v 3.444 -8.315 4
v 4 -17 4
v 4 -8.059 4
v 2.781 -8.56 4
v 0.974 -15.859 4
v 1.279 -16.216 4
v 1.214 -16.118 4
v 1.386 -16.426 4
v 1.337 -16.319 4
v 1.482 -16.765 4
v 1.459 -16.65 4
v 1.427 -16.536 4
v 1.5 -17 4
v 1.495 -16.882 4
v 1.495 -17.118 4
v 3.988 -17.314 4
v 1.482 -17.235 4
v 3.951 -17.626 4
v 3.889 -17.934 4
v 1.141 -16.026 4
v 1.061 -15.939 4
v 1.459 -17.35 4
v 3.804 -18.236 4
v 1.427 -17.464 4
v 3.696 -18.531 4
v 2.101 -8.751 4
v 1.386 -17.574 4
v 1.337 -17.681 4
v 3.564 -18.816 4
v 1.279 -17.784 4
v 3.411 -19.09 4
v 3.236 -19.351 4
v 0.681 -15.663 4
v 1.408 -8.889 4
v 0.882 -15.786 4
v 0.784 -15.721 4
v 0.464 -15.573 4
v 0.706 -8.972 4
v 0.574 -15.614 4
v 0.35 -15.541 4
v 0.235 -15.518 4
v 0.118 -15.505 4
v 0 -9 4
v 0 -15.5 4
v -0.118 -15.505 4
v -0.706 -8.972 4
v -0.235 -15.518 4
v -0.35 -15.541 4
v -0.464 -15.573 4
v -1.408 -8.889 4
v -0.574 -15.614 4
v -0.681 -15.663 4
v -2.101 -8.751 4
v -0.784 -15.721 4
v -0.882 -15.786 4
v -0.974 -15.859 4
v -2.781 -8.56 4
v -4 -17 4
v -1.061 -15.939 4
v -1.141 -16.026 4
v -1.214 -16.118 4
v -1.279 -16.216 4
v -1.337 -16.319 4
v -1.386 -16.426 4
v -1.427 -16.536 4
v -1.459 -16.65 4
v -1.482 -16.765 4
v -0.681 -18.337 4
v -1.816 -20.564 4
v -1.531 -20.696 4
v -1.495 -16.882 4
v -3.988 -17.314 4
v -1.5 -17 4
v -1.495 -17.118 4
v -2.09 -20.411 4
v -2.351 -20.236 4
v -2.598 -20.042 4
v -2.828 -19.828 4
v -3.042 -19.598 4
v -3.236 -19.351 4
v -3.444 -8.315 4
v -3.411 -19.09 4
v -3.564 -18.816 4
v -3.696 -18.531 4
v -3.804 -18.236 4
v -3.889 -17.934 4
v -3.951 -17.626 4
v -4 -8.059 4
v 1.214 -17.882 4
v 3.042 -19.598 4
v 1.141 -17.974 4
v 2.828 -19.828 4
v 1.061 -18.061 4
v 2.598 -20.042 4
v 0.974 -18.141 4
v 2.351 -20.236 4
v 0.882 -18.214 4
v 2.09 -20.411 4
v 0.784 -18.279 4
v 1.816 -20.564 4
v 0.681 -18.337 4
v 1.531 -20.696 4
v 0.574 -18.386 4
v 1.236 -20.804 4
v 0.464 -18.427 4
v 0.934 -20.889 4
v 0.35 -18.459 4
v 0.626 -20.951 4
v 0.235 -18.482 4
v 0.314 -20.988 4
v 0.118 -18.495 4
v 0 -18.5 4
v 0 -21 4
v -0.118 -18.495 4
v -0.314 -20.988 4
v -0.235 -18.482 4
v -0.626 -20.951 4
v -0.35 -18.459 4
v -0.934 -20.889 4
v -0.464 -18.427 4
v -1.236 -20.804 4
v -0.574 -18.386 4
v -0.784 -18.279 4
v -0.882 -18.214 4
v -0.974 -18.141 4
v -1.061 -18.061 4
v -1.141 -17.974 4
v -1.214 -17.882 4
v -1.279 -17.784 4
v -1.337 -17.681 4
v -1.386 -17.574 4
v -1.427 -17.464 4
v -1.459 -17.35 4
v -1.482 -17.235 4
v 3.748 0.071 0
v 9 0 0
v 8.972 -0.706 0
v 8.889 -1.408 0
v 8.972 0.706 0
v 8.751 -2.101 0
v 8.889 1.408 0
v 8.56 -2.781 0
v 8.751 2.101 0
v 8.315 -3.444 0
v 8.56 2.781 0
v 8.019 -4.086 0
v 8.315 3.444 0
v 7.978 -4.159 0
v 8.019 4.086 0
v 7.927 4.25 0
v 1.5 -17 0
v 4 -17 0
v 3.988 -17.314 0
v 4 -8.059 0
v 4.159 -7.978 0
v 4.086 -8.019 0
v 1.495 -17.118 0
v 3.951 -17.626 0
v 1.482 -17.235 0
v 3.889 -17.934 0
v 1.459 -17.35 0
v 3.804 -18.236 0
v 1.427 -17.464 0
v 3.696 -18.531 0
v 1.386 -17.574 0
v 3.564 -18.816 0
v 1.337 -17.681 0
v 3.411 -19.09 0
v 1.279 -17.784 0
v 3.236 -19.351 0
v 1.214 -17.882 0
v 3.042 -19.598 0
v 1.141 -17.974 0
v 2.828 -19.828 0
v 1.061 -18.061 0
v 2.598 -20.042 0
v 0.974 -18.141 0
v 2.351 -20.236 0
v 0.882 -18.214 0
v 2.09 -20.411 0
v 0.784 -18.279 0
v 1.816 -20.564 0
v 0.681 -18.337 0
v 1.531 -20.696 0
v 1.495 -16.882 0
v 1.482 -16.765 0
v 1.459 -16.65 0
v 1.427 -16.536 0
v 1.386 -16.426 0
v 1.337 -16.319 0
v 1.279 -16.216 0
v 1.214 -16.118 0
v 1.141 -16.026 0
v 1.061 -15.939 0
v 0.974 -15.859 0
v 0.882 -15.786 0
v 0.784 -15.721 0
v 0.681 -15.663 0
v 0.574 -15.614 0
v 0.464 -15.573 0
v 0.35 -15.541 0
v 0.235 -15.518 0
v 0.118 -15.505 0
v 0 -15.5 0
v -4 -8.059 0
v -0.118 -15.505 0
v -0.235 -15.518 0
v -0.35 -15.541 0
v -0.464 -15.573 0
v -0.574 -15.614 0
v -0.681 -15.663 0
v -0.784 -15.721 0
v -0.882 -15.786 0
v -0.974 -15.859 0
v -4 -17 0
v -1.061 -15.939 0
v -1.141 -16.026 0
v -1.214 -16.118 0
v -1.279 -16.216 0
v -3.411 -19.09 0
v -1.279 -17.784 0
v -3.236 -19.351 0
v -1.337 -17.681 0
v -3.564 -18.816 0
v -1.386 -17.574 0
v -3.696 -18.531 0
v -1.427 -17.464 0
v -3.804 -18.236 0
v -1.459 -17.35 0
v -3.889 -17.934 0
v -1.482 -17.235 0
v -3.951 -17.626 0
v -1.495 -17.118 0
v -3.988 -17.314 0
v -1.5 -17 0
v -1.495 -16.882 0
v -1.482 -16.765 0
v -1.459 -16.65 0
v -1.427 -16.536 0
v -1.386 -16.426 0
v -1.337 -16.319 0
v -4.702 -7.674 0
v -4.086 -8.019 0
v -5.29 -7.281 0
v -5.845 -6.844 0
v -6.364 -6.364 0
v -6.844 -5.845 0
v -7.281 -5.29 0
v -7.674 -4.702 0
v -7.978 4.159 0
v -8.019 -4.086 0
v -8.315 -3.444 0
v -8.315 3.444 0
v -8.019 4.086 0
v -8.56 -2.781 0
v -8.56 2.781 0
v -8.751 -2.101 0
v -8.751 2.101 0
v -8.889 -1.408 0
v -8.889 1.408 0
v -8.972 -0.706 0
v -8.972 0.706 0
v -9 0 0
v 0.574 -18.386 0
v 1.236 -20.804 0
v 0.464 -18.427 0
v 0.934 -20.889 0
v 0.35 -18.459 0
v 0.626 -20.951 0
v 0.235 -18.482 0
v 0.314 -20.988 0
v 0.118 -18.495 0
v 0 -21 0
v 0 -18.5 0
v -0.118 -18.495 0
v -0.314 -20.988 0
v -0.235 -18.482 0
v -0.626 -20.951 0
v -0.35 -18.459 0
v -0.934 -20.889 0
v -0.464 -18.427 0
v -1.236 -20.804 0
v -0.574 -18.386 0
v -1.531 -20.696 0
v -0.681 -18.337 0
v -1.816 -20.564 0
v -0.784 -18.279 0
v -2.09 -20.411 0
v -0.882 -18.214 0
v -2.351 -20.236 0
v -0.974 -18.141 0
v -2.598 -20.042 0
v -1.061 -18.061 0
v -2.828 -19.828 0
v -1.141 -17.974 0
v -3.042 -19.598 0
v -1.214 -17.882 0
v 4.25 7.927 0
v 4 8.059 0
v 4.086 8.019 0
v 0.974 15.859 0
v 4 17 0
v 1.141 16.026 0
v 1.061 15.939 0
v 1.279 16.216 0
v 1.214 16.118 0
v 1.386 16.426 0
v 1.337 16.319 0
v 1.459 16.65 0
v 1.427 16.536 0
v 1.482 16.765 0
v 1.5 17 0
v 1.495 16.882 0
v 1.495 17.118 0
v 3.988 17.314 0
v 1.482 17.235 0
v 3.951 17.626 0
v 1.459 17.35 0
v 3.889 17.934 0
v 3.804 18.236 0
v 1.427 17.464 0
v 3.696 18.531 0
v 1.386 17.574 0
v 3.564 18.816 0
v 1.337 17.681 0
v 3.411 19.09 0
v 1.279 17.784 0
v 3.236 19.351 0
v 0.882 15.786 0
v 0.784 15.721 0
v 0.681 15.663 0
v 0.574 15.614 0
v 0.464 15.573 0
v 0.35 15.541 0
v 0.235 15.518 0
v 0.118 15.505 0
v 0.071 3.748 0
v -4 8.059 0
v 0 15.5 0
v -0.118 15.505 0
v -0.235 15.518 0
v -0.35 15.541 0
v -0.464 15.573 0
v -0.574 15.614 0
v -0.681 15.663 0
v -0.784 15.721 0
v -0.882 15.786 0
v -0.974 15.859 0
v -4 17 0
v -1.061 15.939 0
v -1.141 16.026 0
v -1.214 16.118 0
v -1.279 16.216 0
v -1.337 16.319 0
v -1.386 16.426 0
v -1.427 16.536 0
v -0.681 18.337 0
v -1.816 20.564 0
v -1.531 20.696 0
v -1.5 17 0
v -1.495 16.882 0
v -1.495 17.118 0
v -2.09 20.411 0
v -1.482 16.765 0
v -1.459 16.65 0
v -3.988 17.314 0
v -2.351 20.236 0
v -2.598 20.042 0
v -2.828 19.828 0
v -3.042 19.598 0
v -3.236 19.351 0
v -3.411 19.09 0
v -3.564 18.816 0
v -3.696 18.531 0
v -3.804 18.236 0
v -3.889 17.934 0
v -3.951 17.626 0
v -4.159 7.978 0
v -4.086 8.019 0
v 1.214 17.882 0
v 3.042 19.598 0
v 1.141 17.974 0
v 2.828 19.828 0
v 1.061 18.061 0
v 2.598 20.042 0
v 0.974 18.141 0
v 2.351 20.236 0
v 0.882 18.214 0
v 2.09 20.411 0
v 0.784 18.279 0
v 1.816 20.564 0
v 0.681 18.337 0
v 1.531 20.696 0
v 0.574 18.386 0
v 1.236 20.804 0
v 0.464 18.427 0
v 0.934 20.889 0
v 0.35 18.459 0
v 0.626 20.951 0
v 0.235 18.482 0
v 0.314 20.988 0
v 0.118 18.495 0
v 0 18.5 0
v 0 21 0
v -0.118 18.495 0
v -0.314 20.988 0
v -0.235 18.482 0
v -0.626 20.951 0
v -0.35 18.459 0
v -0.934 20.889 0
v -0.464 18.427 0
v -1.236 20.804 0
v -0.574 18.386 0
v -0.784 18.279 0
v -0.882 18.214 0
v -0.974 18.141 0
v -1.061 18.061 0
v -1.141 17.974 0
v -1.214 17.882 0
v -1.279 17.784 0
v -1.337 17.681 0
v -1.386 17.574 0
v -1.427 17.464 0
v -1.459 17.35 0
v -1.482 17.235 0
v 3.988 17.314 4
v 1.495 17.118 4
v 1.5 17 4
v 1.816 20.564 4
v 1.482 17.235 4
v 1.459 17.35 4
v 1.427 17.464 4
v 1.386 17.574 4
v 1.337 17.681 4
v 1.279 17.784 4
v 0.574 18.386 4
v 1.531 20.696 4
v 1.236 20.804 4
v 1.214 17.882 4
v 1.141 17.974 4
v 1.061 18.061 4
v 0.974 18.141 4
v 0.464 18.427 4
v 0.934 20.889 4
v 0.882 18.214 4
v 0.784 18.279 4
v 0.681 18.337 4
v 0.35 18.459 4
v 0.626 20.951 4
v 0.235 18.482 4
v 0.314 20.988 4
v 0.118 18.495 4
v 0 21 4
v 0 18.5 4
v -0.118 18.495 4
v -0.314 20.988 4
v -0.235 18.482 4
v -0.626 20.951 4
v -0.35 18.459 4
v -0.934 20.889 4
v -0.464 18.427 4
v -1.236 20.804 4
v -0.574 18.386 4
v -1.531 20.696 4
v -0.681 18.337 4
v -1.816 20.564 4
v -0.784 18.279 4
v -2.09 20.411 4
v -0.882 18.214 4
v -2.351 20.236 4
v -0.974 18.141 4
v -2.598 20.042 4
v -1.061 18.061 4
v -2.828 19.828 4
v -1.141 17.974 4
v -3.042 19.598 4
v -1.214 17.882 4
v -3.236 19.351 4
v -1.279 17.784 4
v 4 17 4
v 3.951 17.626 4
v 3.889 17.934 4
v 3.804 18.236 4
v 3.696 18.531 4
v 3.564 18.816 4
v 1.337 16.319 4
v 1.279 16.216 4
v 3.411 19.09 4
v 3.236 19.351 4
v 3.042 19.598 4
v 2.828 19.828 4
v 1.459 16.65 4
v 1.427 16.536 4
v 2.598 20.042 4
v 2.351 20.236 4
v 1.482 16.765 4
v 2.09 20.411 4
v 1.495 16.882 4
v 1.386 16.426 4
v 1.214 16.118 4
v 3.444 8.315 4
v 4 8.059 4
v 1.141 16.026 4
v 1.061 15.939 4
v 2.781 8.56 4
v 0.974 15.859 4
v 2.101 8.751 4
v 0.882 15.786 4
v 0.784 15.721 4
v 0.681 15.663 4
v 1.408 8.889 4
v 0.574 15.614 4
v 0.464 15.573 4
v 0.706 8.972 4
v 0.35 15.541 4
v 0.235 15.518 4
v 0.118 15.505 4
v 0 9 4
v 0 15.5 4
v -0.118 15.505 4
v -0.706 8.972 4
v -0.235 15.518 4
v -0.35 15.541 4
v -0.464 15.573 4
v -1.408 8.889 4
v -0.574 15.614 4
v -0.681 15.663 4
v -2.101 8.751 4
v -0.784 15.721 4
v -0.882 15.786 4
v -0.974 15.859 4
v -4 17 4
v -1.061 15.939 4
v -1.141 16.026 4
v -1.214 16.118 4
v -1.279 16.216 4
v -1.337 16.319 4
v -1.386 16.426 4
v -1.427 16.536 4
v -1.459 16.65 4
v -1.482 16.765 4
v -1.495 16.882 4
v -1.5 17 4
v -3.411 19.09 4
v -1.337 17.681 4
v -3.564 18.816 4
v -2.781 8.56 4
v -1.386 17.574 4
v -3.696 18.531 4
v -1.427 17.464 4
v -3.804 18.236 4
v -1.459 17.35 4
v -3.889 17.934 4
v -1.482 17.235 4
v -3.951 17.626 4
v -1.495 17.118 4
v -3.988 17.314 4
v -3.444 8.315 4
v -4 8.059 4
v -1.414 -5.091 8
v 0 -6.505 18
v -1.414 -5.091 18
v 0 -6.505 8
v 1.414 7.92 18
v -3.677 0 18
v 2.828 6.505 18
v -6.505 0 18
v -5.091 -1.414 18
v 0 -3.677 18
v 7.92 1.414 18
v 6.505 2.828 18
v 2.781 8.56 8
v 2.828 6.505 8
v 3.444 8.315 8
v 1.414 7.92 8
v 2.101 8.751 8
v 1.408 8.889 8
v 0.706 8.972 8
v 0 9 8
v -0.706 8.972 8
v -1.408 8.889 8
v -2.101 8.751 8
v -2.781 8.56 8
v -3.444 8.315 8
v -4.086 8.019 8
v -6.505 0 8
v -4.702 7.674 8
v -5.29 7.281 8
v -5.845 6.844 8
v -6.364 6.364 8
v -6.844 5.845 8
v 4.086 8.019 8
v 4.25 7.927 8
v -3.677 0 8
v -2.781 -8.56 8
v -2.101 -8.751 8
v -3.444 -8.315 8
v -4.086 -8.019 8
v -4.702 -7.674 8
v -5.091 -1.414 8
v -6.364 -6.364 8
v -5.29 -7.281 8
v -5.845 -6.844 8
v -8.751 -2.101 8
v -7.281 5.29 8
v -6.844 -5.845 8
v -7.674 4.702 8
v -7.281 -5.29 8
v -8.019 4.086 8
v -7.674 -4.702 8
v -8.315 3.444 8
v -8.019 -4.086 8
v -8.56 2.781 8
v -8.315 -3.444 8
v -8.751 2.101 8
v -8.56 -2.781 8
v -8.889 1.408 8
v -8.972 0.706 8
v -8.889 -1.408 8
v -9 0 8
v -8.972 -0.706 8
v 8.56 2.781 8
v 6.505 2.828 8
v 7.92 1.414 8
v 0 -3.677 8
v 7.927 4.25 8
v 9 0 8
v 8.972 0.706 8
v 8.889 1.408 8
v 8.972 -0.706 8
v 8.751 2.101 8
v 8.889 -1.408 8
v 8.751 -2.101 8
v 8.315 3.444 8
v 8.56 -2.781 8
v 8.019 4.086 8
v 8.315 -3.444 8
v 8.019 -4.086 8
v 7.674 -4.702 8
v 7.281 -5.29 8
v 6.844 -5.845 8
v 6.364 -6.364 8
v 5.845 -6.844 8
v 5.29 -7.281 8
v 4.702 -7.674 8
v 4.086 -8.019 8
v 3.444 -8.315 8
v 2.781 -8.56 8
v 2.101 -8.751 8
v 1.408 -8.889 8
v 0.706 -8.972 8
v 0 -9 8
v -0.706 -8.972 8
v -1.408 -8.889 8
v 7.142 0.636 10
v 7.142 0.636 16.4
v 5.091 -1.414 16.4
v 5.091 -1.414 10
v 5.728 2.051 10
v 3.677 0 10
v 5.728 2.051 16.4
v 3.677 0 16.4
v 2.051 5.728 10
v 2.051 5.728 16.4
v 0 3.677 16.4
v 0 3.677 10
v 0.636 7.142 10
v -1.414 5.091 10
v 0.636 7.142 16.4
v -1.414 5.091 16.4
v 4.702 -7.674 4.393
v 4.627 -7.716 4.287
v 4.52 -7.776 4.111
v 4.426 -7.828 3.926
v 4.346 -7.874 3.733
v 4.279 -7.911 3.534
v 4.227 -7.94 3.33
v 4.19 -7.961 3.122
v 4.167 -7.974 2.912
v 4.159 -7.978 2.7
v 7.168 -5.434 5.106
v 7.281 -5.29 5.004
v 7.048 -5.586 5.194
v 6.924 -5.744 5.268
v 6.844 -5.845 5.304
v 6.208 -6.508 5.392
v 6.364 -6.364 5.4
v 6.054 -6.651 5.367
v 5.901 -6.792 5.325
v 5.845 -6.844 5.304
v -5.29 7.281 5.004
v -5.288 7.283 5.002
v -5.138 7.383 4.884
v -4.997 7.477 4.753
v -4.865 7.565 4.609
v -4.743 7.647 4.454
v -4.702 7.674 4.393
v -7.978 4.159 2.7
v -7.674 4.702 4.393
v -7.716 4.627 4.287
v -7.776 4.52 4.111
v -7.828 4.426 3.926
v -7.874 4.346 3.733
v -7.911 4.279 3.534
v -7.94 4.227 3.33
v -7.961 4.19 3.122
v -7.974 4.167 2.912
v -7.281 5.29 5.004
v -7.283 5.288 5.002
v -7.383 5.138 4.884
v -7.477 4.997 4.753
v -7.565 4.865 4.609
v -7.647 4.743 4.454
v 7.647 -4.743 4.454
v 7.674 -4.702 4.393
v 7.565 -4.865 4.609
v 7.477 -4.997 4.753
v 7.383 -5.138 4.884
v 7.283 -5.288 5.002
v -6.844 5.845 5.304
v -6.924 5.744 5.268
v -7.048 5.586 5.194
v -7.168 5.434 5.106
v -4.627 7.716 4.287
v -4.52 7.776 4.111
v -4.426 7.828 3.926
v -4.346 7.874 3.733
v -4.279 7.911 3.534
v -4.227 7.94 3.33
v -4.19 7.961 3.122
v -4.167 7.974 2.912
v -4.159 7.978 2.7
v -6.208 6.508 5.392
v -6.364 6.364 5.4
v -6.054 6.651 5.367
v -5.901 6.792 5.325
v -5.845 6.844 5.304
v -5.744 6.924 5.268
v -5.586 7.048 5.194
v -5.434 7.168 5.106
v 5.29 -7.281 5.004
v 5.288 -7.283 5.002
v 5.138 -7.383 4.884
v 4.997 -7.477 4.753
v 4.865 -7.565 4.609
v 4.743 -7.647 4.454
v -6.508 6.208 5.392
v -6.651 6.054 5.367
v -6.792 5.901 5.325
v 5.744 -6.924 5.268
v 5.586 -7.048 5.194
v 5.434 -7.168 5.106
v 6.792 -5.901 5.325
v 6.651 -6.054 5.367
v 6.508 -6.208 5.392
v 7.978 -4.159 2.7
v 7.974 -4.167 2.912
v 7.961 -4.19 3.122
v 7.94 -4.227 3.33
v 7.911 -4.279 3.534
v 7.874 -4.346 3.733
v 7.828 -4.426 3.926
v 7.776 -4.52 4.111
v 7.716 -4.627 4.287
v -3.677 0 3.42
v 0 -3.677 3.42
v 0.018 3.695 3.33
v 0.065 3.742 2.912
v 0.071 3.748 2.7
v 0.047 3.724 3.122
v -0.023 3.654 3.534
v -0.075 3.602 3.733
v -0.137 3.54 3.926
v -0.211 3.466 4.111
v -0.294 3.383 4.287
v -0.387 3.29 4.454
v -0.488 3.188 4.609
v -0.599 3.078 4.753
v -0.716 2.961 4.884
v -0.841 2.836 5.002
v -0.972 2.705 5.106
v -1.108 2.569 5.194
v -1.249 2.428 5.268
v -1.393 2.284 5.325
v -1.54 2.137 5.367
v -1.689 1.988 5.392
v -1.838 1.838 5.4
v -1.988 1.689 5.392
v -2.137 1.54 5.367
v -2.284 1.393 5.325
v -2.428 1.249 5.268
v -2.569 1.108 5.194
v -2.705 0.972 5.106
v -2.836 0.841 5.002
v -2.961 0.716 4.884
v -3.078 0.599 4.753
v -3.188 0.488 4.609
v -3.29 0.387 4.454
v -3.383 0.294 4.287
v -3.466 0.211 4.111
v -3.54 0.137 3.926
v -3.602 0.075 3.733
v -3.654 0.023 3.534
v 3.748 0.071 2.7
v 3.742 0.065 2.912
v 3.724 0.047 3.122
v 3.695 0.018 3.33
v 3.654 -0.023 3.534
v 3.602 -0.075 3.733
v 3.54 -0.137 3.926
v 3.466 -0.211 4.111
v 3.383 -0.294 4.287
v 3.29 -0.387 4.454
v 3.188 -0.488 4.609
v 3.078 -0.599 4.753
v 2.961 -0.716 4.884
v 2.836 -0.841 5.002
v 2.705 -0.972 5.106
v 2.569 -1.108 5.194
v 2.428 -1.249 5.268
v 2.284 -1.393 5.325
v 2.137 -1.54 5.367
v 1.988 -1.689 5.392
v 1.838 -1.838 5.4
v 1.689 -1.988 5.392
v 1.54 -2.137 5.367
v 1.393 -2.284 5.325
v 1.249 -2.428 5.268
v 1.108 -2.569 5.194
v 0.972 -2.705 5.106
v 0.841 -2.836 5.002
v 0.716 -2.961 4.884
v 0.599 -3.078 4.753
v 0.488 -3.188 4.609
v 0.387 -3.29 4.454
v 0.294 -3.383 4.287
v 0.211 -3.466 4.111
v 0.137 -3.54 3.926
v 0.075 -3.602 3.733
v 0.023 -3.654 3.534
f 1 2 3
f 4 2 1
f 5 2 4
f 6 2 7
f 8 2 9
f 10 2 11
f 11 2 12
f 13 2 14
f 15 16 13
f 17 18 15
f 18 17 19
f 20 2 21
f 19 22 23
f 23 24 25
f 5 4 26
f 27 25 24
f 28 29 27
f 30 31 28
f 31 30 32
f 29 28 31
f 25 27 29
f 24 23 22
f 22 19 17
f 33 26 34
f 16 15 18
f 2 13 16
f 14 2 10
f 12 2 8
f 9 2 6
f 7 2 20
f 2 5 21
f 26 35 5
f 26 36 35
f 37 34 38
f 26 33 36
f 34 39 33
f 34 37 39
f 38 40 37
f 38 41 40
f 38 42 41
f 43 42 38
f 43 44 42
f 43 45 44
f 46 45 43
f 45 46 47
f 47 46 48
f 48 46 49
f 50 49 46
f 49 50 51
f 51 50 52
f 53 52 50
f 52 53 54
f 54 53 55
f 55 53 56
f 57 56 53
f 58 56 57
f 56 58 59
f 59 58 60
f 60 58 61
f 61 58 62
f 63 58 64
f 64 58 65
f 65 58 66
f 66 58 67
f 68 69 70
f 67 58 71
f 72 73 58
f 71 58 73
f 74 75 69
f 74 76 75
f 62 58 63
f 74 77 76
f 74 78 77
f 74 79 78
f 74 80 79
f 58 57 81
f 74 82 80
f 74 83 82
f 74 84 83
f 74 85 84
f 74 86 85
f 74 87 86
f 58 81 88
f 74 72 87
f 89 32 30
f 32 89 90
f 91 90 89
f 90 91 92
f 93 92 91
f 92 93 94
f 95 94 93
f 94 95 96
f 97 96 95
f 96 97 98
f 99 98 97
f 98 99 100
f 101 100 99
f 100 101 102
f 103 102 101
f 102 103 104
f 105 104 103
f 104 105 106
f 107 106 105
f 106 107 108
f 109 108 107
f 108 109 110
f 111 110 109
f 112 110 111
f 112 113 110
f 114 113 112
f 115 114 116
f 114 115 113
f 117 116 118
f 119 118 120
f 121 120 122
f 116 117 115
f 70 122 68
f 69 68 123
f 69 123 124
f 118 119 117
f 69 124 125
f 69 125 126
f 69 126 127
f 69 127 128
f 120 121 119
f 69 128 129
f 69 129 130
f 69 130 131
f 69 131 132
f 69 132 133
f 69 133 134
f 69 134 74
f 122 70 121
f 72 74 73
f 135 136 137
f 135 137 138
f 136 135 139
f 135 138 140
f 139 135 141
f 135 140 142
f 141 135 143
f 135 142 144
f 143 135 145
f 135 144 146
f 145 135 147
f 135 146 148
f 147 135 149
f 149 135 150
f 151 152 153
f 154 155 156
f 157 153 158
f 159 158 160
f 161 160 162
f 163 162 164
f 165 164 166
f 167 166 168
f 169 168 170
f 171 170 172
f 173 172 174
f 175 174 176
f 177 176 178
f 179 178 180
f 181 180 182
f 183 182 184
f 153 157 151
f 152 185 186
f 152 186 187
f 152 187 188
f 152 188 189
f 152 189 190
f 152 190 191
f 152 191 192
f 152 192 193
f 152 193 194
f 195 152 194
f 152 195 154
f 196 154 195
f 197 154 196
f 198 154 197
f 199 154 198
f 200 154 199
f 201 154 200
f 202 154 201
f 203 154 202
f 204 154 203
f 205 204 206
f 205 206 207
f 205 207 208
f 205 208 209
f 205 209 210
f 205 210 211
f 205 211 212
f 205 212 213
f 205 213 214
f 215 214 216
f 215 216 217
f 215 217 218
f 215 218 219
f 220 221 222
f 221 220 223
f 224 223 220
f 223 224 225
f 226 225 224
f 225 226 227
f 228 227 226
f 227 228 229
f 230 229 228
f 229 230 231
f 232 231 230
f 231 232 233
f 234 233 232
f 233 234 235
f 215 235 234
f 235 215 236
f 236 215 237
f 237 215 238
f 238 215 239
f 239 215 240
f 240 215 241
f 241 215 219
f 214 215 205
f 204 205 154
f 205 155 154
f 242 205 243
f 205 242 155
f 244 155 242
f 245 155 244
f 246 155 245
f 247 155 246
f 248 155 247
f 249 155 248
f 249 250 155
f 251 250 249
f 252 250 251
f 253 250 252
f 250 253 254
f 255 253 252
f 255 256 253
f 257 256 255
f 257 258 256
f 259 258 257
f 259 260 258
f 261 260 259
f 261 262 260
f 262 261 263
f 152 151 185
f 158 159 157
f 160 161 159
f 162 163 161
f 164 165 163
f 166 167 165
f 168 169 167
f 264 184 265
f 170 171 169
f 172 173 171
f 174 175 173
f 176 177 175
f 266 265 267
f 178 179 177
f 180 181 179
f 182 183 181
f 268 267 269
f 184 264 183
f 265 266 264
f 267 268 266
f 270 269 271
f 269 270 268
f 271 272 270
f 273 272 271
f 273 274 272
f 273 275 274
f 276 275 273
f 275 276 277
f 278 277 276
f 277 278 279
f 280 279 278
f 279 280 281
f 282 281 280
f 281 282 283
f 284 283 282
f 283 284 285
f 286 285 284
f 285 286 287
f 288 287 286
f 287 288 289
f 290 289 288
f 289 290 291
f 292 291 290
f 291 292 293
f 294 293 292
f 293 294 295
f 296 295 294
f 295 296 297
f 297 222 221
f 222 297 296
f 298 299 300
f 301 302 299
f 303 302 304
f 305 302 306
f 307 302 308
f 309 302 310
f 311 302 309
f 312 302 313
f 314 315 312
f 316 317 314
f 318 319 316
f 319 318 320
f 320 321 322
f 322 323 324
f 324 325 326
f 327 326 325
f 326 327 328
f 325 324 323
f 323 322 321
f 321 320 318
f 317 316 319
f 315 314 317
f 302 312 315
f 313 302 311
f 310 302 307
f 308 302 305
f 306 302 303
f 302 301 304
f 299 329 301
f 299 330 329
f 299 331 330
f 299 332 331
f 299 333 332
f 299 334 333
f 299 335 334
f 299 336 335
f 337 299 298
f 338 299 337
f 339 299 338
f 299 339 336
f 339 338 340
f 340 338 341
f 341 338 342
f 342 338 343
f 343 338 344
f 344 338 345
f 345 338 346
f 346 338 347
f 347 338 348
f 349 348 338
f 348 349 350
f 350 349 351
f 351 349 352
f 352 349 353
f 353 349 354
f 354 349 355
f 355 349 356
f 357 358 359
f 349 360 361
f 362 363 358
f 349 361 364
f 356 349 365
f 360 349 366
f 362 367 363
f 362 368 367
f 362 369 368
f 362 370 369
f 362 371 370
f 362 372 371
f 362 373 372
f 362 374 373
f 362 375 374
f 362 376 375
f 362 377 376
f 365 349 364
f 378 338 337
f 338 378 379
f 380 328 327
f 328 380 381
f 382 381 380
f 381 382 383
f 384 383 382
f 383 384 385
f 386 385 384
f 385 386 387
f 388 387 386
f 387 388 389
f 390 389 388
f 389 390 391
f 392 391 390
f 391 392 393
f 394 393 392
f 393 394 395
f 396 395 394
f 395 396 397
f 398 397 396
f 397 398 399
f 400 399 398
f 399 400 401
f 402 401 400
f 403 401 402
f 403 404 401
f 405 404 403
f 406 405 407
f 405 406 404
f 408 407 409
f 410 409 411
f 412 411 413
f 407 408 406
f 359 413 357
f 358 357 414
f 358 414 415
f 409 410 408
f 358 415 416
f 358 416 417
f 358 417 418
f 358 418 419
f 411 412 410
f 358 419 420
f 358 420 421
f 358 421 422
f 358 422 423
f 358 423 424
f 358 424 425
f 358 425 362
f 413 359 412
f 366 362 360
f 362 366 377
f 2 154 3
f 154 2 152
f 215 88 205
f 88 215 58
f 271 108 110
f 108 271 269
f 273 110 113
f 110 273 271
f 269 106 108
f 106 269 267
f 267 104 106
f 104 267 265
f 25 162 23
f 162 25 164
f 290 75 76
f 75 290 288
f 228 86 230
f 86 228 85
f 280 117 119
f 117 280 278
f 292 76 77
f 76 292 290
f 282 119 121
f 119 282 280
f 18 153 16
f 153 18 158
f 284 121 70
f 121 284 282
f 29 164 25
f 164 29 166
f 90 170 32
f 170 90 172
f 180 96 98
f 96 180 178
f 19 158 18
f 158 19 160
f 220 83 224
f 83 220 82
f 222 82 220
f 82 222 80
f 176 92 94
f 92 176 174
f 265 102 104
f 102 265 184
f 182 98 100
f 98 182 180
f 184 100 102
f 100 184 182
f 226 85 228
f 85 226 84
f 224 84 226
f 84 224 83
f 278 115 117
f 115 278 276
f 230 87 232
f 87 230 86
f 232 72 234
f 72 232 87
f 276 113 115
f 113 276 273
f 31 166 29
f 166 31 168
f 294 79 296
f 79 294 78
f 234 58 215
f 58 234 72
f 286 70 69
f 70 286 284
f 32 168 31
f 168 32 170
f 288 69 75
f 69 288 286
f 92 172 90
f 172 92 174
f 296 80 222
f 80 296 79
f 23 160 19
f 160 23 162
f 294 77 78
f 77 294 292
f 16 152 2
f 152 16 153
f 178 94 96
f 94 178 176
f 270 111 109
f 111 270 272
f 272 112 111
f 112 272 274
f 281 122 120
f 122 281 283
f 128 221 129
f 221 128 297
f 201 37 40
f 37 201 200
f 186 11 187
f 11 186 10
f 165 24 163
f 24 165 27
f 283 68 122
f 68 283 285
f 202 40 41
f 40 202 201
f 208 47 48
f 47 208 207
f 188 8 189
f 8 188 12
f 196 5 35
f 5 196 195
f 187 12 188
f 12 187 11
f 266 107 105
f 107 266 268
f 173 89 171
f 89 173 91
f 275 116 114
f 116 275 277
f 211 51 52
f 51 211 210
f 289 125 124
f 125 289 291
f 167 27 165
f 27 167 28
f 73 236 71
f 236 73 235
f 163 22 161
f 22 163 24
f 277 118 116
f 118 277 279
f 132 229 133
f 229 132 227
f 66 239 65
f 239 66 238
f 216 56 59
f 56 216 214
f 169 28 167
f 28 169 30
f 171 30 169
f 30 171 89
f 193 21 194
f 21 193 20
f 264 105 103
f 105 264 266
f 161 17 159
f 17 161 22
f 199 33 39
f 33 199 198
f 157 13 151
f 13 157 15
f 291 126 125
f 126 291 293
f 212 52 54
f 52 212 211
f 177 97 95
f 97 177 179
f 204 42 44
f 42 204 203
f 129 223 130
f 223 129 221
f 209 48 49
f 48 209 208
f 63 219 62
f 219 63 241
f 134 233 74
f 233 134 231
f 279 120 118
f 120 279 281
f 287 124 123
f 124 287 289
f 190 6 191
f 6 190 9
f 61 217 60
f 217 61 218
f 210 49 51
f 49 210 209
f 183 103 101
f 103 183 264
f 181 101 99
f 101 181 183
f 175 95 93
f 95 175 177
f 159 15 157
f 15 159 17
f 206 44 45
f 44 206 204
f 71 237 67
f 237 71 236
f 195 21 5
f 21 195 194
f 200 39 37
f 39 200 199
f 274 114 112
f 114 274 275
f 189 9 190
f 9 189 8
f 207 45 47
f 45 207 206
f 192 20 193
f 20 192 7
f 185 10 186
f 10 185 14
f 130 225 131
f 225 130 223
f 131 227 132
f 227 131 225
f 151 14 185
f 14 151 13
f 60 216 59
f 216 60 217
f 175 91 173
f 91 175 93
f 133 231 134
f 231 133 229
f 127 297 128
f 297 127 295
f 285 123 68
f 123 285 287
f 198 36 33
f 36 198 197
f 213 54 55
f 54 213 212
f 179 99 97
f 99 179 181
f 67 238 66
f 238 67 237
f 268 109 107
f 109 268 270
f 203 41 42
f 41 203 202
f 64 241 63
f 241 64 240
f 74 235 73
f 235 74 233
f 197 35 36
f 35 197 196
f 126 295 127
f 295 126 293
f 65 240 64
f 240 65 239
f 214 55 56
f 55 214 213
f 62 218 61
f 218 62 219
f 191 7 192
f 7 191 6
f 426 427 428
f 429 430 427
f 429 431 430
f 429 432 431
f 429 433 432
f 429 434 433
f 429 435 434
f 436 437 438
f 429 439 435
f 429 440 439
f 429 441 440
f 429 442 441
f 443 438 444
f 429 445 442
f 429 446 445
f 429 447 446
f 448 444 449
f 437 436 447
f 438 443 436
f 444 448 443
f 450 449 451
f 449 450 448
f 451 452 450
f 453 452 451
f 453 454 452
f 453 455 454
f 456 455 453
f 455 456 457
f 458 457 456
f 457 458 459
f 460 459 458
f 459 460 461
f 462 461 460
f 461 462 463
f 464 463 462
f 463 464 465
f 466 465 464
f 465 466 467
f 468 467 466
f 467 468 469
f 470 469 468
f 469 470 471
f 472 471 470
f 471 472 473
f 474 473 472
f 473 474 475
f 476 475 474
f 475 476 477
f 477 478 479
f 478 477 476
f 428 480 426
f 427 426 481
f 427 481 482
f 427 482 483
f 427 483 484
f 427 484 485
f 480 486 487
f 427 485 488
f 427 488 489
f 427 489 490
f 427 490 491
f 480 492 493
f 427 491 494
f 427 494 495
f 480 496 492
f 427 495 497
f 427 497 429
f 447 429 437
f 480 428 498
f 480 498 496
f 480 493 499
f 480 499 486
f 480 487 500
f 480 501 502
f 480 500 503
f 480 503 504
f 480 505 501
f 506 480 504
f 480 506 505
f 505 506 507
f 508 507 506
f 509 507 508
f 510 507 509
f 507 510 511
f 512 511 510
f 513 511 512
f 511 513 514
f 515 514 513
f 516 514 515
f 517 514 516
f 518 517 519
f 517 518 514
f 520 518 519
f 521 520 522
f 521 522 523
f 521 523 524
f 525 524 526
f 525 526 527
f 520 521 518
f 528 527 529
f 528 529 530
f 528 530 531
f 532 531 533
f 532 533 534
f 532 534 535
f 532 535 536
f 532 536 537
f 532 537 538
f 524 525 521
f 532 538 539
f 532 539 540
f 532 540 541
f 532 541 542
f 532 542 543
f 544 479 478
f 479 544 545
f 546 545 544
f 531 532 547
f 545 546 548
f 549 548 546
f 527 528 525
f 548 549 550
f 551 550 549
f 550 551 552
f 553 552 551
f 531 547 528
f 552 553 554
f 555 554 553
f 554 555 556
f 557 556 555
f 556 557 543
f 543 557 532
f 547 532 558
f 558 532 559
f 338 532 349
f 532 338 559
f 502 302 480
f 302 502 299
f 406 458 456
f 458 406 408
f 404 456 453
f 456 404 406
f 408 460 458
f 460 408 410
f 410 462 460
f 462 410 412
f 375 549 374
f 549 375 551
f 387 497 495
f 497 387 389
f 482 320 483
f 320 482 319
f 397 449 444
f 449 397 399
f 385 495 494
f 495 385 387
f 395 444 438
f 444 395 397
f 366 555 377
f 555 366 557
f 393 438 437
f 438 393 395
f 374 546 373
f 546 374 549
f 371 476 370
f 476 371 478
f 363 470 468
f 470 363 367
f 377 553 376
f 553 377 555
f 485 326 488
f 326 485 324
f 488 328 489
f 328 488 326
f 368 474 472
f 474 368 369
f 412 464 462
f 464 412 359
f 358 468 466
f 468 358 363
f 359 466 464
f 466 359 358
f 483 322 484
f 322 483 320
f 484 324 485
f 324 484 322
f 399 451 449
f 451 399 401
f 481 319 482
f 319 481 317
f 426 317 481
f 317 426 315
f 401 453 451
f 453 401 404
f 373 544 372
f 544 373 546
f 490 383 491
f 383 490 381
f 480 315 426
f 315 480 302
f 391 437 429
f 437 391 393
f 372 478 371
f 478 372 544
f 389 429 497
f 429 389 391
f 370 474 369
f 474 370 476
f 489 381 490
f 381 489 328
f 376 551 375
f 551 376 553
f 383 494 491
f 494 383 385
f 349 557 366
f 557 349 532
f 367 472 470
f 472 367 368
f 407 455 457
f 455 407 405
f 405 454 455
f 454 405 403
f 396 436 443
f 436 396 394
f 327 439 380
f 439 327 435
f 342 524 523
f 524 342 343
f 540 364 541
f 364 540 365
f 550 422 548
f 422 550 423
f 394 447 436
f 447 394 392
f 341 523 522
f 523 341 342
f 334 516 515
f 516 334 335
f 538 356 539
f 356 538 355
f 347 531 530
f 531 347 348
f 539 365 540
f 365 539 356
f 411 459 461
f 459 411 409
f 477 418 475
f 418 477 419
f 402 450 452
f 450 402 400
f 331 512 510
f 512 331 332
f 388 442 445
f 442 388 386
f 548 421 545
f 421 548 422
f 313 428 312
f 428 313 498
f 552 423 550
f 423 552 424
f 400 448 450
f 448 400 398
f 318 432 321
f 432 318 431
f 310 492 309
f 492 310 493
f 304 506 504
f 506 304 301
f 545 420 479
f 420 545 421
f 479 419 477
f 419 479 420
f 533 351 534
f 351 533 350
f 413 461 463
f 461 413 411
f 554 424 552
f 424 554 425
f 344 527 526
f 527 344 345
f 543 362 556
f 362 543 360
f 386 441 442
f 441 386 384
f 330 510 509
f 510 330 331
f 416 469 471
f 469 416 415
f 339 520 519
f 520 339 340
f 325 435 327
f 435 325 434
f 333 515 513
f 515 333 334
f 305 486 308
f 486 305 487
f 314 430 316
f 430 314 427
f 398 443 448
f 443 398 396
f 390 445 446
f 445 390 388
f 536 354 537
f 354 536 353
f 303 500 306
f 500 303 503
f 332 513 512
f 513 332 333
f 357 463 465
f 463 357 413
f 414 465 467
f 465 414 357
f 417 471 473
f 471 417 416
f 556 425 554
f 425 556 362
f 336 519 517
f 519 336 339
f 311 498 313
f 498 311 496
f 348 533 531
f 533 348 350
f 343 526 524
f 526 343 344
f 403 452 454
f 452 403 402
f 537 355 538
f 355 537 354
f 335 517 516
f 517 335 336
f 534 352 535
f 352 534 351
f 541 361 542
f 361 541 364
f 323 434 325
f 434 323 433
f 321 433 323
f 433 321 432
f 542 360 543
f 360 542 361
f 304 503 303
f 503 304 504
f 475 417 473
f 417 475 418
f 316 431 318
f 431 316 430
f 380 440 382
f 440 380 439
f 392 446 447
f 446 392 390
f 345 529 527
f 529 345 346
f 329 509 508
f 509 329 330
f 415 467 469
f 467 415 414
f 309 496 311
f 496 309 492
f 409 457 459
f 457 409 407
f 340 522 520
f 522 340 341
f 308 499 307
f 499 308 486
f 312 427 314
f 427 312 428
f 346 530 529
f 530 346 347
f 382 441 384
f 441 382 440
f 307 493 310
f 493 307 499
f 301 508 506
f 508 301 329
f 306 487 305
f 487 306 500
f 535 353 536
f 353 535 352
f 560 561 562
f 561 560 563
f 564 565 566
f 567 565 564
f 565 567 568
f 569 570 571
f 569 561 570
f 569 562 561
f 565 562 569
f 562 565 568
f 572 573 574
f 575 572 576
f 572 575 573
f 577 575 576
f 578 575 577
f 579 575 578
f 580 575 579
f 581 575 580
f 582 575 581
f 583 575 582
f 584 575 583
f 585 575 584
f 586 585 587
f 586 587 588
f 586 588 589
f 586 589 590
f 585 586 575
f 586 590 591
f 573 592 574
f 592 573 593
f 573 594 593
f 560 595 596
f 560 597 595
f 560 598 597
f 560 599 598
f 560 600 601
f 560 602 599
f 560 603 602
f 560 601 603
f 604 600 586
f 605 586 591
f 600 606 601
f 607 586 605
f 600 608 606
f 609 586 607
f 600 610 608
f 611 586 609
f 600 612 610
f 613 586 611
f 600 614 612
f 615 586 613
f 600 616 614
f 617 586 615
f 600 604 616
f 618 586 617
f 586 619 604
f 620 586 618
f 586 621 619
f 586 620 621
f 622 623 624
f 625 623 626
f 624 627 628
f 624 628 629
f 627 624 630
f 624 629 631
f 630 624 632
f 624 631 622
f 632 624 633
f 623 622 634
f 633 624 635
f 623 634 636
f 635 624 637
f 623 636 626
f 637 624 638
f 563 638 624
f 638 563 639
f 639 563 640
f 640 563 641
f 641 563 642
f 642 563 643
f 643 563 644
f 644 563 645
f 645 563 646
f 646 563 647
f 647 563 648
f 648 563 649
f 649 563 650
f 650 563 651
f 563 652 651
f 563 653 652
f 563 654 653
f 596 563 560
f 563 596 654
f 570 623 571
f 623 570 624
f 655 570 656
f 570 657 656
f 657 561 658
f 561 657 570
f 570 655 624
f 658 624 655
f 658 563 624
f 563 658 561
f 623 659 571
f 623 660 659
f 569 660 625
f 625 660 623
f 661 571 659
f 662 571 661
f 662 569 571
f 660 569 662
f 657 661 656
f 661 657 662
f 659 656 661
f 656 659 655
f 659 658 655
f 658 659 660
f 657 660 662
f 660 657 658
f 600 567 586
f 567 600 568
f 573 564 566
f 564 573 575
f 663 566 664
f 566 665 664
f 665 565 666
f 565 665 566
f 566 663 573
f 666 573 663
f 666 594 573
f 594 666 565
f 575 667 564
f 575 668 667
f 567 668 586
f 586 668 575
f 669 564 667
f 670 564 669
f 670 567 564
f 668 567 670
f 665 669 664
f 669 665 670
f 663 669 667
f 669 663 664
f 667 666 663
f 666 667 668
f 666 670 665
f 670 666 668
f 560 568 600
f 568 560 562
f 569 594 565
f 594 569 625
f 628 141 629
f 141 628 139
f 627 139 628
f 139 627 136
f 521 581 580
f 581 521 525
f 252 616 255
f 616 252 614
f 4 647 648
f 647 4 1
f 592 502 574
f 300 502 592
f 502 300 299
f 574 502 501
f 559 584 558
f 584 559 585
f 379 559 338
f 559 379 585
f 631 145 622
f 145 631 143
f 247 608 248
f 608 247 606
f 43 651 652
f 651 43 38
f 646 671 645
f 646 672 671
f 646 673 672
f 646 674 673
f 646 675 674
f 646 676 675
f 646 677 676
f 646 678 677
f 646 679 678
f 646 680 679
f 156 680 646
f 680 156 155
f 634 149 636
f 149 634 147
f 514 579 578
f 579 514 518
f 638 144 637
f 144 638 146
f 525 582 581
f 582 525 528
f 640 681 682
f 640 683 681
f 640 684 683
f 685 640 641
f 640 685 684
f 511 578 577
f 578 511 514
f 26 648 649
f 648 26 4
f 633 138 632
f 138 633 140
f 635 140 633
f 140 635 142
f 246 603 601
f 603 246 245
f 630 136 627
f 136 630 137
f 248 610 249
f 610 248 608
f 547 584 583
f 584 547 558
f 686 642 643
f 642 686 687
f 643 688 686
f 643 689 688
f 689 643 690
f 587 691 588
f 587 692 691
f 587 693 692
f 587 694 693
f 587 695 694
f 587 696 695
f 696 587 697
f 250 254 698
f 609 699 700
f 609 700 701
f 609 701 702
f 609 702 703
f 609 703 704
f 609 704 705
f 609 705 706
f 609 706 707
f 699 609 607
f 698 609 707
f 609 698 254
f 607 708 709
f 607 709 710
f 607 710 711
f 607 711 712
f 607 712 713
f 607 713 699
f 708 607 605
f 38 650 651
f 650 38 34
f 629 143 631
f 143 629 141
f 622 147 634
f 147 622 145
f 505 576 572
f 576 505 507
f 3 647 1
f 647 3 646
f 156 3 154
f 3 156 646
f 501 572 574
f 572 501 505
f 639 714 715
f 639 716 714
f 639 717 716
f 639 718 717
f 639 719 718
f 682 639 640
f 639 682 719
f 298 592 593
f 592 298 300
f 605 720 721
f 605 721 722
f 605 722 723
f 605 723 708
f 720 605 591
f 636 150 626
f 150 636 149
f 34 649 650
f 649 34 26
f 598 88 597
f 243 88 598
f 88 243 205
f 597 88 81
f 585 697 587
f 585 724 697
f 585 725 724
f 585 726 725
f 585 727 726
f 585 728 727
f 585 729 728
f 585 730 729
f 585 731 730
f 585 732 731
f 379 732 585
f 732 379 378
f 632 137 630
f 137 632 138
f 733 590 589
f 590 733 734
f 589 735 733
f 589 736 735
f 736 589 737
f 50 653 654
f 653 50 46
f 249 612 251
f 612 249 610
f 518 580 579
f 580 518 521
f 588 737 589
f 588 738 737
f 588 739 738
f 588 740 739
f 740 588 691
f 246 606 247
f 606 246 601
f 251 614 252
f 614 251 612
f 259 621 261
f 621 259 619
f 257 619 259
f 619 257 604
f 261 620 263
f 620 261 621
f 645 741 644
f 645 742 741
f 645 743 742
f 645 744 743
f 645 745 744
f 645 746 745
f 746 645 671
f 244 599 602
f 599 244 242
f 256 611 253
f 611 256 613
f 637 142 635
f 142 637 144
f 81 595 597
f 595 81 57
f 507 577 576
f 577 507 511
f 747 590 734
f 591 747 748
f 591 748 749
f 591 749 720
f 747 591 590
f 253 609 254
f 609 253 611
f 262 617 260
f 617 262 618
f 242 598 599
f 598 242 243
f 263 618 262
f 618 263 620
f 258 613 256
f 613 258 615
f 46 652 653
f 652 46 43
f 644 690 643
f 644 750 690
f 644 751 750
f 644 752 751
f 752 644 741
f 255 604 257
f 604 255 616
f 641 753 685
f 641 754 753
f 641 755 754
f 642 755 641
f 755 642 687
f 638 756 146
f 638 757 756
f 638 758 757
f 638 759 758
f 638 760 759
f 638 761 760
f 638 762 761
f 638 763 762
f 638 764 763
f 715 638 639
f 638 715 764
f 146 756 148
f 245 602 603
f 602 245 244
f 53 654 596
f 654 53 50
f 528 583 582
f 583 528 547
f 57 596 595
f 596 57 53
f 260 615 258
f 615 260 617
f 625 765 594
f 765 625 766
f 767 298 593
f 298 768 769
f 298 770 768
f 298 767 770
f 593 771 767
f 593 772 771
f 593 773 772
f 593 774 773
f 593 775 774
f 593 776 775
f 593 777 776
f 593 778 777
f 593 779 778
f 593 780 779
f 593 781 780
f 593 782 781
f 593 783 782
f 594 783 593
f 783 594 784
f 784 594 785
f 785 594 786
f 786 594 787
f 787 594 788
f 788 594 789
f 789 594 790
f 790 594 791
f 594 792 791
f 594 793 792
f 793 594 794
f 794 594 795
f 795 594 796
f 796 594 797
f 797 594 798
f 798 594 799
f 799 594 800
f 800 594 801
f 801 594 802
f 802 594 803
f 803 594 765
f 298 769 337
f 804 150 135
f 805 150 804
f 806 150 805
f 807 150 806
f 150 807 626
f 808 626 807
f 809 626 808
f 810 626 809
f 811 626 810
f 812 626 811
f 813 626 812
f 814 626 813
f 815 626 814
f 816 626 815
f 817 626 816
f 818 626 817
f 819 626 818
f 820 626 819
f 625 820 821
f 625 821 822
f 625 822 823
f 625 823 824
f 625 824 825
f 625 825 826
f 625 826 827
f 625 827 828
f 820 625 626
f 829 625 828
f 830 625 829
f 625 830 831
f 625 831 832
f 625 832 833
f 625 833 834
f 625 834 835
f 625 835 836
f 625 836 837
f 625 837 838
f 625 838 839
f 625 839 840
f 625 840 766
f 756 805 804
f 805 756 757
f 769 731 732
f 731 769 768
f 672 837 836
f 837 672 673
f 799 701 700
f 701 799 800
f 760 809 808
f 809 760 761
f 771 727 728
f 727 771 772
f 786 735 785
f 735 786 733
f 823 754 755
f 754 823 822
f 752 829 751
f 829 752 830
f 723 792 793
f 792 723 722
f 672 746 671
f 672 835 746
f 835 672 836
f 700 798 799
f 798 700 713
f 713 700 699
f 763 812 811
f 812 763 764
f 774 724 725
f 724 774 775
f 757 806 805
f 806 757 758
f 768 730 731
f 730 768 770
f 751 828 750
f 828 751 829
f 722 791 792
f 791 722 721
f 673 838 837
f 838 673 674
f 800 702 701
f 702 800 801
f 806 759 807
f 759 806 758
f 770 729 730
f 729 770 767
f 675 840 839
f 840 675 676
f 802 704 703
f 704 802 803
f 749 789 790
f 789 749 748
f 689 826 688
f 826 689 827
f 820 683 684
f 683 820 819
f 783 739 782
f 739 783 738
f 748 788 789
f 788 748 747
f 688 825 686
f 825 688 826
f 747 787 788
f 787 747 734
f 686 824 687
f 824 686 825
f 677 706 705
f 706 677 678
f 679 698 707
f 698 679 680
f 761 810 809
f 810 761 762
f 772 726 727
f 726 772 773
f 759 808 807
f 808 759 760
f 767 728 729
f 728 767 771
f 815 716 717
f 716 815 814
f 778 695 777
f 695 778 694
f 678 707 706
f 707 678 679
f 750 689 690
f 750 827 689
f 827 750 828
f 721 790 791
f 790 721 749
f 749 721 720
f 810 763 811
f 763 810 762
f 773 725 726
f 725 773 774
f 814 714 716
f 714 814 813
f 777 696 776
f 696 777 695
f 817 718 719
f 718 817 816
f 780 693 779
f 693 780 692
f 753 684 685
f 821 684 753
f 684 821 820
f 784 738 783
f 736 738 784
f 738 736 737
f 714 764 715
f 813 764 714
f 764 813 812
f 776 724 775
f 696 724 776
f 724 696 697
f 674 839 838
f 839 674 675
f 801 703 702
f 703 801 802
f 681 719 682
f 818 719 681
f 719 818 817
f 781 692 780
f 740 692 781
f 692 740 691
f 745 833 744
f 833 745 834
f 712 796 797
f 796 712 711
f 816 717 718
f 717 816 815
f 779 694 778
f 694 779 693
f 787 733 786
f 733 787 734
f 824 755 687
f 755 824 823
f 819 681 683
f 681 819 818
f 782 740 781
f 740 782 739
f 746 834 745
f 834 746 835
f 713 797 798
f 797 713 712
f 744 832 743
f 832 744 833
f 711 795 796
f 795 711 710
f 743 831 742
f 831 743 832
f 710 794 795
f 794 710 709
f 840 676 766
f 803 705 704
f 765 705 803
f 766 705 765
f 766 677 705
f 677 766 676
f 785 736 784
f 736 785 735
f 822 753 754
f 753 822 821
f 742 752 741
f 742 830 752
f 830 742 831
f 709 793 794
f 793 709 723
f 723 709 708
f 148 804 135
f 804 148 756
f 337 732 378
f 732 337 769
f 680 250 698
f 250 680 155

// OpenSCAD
/*
All configuration variables that you should need to worry about are contained in
the following section.
*/
// Flags to turn parts on/off when generating stl files
bShowBase = true;
bShowLockingClip = false;
bShowMast = false;
bShowPlatform = false;

smoothness = 80;
partGap = 0.2;

baseDiskDiameter = 18;
baseHeight = 4;

numMountingFlanges = 2;

flangeHoleCenterOffset = 34/2;  //Spacing of mounting holes on erel copter base is 34 mm.

flangeWidth = 8;
flangeHoleDiameter = 3;

cageThickness = 2;
cageHeight = 10;
cageSlotVertOffset = 2;

clipHeight = 6;
clipThickness = 2.5;

pivotPointDiameter = 5;

mastLength = 105;

platformDiameter = 35;
platformHeight = 6;

numLighteningHoles = 5;
mastPocketThickness = 2;

/*
End of configuration variables.
*/

flangeLength = flangeHoleCenterOffset - baseDiskDiameter/2 + flangeWidth/2;

mastWidth = pivotPointDiameter;
mastRoundingDiameter = mastWidth * 1.2;

pivotSlotDiameter = pivotPointDiameter+partGap*2;
pivotSlotWidth = mastWidth+partGap;

cageLength = pivotSlotWidth+cageThickness+4;
cageWidth = pivotSlotWidth+cageThickness*2;

clipWidth = cageWidth + partGap;

cageSlotHeight = clipHeight + partGap*2;
cageSlotWidth = clipThickness + partGap*2;

mastPocketOverallWidth = mastWidth + mastPocketThickness*2;

//Build the assembly
gpsMast();

module gpsMast() {
	union() {
		if (bShowBase)
			base();
		if (bShowMast)
			mast();
		if (bShowPlatform)
			platform();
		if (bShowLockingClip)
			lockingClip();
	}
}

module platform() {
	union() {
		// The platform body
		difference() {
			union() {
				translate([0,0,mastLength])
					cylinder(d2=platformDiameter, d1=mastWidth, h=platformHeight/2, $fn=smoothness);
				translate([0,0,mastLength+platformHeight/2])
					cylinder(d=platformDiameter, h=platformHeight/2, $fn=smoothness);
				//translate([0,0,mastLength-mastWidth*2+1])
				//	cylinder(d2=mastWidth*2, d1=0, h=mastWidth*2);
			}
			// Remove the 4 lightening holes
			for(index = [0 : numLighteningHoles-1])
				rotate([0,0,(360/numLighteningHoles)*index])
					translate([platformDiameter/3,0, mastLength])
						cylinder(d=platformDiameter/5, h=platformHeight, $fn=smoothness);
		}
		// Add the pocket for attaching to the mast
		difference() {
			rotate([0,0,45])
				translate([-mastPocketOverallWidth/2, -mastPocketOverallWidth/2, 	mastLength-mastPocketOverallWidth+platformHeight/2])
					cube(mastPocketOverallWidth,mastPocketOverallWidth,mastPocketOverallWidth);
			rotate([0,0,45])
				translate([-mastWidth/2, -mastWidth/2, mastLength-mastWidth-platformHeight/2+mastPocketThickness])
					#cube(mastWidth,mastWidth, mastWidth);
		}
	}
}

module lockingClip() {
  rotate(45,0,0)
    translate([cageSlotWidth-partGap,-clipWidth/2,baseHeight*2+cageSlotVertOffset+partGap])
      difference() {
        union() {
          // Body of clip
          cube([clipThickness, clipWidth, clipHeight]);
          // End Stop of clip
          translate([-clipThickness/2,clipWidth,-clipThickness/2])
            cube([clipThickness*2, clipThickness, clipHeight+clipThickness]);
          // Latch of clip
          rotate([0,270,0])
            translate([-clipHeight/4+clipHeight/2,-clipHeight/2,-clipHeight/1.7])
              prism(clipHeight/2, clipHeight/2, clipHeight/2);
        }
        // Remove material to make the clip movable
        translate([0,-1, clipHeight/4])
          cube([clipThickness/2, clipWidth+1, clipHeight/2]);
        translate([0,-1, clipHeight/2+clipHeight/4])
          cube([clipThickness, clipWidth+1, partGap]);
          translate([0,-1, clipHeight/2-clipHeight/4-partGap])
            cube([clipThickness, clipWidth+1, partGap]);
      }
}

module mast() {
	//translate([-mastPivotHeight/2,-mastPivotWidth/2,baseHeight+mastVerticalOffset+partGap])
	rotate([0,0,45])
    union() {
      // The mast itself
      intersection(){
          translate([-mastWidth/2,-mastWidth/2,mastWidth/2])
  		      cube([mastWidth, mastWidth, mastLength-mastWidth/2]);
          translate([0,0,mastLength/2])
            cylinder(d=mastRoundingDiameter, h=mastLength, center=true, $fn=smoothness);
      }
      // The pivot point
      rotate([90,0,0])
        translate([0,mastWidth/2,-baseDiskDiameter/2])
          cylinder(d=mastWidth, h=baseDiskDiameter, $fn=smoothness);
    }
}

module base() {
  difference() {
  	union() {
  		// Base Disc
  		cylinder(d=baseDiskDiameter, h=baseHeight*2, $fn=smoothness);

      // Mounting Flanges
  		baseMountFlanges();

      // Locking cage
      rotate([0,0,135])
        union() {
          //  Back
          translate([-cageWidth/2,pivotSlotWidth/2,baseHeight*2])
            cube([cageWidth, cageThickness, cageHeight]);
          //  Side
          rotate([0,0,90])
            translate([-cageLength/2-cageThickness/2,pivotSlotWidth/2,baseHeight*2])
              difference() {
                cube([cageLength, cageThickness, cageHeight]);
                rotate([0,0,90])
                  translate([0,-cageWidth+mastWidth+partGap,cageSlotVertOffset])
                    cube([cageThickness+.2, cageSlotWidth, cageSlotHeight]);
              }
          //  Side
          rotate([0,0,90])
            translate([-cageLength/2-cageThickness/2,-cageWidth/2,baseHeight*2])
              difference() {
                cube([cageLength, cageThickness, cageHeight]);
                rotate([0,0,90])
                  translate([0,-cageWidth+mastWidth+partGap,cageSlotVertOffset])
                    cube([cageThickness+.2, cageSlotWidth, cageSlotHeight]);
              }
        }
  	}

    //Slot for mast
    rotate([0,0,45])
      translate([-pivotSlotWidth/2, -pivotSlotWidth/2, 0])
        cube([baseDiskDiameter, pivotSlotWidth, baseHeight*2]);

    // Slot for pivot
    rotate([0,0,45])
      translate([0,baseDiskDiameter/2+partGap,(pivotSlotDiameter)/2])
        rotate([90,0,0])
          cylinder(d=pivotSlotDiameter, h=baseDiskDiameter+partGap*2, $fn=smoothness);
    rotate([0,0,45])
      translate([-(pivotSlotDiameter)/2,baseDiskDiameter/2+partGap,-(pivotSlotDiameter)/2])
        rotate([90,0,0])
          cube([pivotSlotDiameter, pivotSlotDiameter, baseDiskDiameter+partGap*2]);
  }
}

module baseMountFlanges() {
	for(index = [0 : numMountingFlanges-1])
		rotate([0,0,-90+(360/numMountingFlanges*index)+(numMountingFlanges % 2 ? ((360/numMountingFlanges)/2) : 0)])
			baseMountFlange();
}

module baseMountFlange() {
		translate([baseDiskDiameter/2-flangeWidth/2, -flangeWidth/2, 0])
			difference() {
				union() {
					cube([flangeLength, flangeWidth, baseHeight]);
					translate([flangeLength,flangeWidth/2,0])
						cylinder(d=flangeWidth, h=baseHeight, $fn=smoothness);
				}
				translate([flangeLength,flangeWidth/2,0])
					cylinder(d=flangeHoleDiameter, h=baseHeight, $fn=smoothness);
			}
}

module prism(l, w, h){
      polyhedron(
              points=[[0,0,0], [l,0,0], [l,w,0], [0,w,0], [0,w,h], [l,w,h]],
              faces=[[0,1,2,3],[5,4,3,2],[0,4,5,1],[0,3,4],[5,2,1]]
              );
}
